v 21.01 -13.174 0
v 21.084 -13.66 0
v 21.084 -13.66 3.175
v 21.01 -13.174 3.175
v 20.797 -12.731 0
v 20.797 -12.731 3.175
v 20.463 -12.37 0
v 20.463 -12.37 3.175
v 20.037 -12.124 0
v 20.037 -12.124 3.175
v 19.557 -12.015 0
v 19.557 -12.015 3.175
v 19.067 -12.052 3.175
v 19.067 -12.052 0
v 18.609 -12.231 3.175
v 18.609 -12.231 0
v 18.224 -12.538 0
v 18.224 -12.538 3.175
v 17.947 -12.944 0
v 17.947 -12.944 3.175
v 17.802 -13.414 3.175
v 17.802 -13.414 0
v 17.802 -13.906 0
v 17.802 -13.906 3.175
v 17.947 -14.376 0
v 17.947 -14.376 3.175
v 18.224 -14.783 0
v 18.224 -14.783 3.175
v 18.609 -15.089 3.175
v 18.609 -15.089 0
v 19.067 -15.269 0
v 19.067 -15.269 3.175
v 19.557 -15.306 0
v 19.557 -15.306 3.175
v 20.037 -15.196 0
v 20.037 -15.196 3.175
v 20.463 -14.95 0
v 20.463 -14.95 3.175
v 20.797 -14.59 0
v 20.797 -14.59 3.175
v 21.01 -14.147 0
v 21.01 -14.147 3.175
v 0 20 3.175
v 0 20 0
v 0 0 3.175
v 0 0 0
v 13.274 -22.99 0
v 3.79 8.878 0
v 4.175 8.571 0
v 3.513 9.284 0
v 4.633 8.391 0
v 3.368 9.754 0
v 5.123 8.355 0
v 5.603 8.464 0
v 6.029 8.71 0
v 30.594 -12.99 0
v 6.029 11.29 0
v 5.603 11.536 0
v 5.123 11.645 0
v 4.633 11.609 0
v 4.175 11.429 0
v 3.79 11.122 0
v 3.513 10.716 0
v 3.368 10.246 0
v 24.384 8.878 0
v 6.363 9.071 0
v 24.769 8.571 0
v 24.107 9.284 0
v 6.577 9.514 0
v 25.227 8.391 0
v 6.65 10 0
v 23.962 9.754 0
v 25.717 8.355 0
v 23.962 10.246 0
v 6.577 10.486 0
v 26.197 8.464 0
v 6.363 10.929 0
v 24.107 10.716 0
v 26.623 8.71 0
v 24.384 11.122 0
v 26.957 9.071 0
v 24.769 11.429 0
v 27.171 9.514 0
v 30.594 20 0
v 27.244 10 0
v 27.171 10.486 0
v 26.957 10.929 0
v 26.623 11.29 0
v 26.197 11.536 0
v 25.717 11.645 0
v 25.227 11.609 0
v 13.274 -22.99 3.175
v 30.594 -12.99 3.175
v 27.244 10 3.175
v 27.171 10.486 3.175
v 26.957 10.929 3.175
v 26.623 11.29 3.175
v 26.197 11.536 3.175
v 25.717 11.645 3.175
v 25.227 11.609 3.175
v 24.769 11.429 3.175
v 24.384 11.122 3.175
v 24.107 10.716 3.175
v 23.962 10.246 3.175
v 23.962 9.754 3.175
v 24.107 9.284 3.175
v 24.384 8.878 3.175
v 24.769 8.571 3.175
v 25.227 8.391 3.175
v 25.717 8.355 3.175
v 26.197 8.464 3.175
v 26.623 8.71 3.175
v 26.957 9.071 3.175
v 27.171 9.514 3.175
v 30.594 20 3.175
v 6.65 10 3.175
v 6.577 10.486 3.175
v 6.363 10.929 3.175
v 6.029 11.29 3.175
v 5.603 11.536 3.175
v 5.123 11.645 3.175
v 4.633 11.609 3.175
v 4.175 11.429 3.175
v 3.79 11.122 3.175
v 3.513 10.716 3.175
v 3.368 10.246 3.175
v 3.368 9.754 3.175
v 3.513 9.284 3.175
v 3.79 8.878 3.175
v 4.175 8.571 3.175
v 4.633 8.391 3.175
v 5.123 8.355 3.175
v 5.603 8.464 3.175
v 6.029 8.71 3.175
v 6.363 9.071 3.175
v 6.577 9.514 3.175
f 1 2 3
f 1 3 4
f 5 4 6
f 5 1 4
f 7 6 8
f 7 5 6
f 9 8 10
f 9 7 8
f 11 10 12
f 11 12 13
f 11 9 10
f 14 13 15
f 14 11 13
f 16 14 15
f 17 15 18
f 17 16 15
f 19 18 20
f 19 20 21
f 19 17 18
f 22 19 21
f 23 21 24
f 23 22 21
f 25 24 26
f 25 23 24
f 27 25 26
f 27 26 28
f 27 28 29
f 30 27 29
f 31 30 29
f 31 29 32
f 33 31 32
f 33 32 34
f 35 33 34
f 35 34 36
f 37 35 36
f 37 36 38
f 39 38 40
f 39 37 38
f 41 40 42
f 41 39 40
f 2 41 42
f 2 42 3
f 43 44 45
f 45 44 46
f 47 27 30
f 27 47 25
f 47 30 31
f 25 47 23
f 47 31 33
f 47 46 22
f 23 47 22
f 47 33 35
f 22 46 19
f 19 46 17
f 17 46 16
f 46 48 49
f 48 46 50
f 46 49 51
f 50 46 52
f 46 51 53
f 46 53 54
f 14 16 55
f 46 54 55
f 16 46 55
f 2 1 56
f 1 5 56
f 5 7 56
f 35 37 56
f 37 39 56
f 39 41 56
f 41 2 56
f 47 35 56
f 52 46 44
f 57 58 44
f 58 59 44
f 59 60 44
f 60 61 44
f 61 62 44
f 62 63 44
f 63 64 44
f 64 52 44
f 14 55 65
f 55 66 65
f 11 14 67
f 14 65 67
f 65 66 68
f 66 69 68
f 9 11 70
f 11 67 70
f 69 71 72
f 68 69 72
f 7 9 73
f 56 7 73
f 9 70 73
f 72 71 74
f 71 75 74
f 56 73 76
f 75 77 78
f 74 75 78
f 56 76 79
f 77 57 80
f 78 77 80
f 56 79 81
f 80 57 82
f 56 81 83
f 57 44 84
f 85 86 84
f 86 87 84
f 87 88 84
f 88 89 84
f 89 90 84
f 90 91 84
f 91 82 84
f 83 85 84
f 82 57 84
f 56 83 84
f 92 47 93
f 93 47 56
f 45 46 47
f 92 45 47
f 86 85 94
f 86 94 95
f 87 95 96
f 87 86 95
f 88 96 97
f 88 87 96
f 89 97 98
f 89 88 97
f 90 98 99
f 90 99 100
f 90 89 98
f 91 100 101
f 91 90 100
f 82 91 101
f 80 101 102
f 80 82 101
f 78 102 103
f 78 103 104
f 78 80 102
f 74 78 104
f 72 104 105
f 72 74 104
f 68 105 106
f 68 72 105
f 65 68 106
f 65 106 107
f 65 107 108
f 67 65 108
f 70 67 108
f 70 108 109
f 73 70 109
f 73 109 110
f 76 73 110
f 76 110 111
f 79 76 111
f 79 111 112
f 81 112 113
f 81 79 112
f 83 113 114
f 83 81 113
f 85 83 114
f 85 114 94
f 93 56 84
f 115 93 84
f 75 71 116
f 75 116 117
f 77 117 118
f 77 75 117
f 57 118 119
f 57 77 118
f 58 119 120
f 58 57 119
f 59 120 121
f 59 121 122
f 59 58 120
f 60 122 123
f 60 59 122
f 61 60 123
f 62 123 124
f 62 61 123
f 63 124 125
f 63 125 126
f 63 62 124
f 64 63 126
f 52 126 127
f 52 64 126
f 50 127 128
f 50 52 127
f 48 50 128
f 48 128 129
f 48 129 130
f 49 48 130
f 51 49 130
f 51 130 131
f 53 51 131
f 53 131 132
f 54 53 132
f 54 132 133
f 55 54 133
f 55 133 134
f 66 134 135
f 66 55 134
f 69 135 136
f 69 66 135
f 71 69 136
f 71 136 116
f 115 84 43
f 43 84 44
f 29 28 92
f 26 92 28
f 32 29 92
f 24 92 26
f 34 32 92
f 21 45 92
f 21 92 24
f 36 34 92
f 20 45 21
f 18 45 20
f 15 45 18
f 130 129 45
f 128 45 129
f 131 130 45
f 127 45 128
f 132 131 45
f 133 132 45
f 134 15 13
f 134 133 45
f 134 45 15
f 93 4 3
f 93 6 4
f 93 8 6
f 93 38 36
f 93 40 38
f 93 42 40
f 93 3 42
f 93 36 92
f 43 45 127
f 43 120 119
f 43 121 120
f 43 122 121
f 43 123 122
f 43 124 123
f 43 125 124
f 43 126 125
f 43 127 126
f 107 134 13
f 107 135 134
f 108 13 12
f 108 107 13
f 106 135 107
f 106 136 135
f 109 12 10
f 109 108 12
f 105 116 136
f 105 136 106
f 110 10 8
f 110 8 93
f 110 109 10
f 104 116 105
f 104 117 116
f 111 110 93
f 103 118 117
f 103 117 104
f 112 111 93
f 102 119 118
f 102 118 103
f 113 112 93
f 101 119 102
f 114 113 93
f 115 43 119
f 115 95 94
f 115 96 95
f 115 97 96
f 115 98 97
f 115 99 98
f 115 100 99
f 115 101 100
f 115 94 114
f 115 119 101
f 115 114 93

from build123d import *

# Parameters (mm, degrees)
SKETCH1_R           = 1.65
BOSS_EXTRUDE1_DEPTH = 3.175


with BuildPart() as part:
    # Sketch1 → Boss-Extrude1 (new body)
    with BuildSketch(Plane.XY):
        Polygon((0, 0), (13.273502692, -22.990381057), (30.594010768, -12.990381057), (30.594010768, 20), (0, 20), align=None)
        with Locations((19.43375673, -13.660254038)):
            Circle(SKETCH1_R, mode=Mode.SUBTRACT)
        with Locations((5, 10)):
            Circle(SKETCH1_R, mode=Mode.SUBTRACT)
        with Locations((25.594010768, 10)):
            Circle(SKETCH1_R, mode=Mode.SUBTRACT)
    extrude(amount=BOSS_EXTRUDE1_DEPTH)


solid = part.part
